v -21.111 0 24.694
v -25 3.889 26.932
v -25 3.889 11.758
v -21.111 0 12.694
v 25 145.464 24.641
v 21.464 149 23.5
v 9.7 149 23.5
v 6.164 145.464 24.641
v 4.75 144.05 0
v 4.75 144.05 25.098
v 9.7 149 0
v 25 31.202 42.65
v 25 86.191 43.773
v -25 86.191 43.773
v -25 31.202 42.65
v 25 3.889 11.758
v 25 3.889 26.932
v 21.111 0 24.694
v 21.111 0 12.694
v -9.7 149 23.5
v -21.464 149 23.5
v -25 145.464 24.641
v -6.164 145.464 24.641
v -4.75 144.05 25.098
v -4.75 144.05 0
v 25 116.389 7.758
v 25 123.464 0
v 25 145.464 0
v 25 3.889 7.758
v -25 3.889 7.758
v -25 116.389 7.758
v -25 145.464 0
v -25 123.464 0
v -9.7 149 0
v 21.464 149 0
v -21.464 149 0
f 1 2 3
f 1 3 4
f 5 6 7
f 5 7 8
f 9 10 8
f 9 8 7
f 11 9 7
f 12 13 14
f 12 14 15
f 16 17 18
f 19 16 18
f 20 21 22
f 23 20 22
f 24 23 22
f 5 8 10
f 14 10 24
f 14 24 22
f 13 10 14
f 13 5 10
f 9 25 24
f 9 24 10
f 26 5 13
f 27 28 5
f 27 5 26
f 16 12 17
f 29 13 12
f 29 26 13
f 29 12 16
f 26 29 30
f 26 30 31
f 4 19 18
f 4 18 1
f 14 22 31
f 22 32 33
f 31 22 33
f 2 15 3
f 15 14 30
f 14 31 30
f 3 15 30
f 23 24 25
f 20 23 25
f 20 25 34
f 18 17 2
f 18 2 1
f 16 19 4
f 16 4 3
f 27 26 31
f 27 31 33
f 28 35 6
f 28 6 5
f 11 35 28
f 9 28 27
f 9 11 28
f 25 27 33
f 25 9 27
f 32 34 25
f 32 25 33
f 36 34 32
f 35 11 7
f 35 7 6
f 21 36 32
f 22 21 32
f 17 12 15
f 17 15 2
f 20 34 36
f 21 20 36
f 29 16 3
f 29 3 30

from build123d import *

# Parameters (mm, degrees)
F1_DEPTH = 48
F3_DEPTH = 25


with BuildPart() as f1:
    # F0 (on Top) → F1 (new body)
    with BuildSketch(Plane.XY):
        Polygon((-21.110913, 0), (0, 0), (0, 144.050253), (-4.75, 144.050253), (-9.699747, 149), (-21.464466, 149), (-25, 145.464466), (-25, 3.889087), align=None)
    extrude(amount=F1_DEPTH)

    # F2 (on face) → F3 (cut, through all)
    with BuildSketch(Plane(origin=(-25, 0, 0), x_dir=(0, -1, 0), z_dir=(-1, 0, 0))):
        Polygon((-145.464466, 48), (-145.464466, 24.641155), (-86.190659, 43.772807), (-31.202125, 42.649837), (-3.889087, 26.931672), (-3.889087, 48), align=None)
        Polygon((-116.389087, 7.758158), (-123.464466, 0), (-3.889087, 0), (-3.889087, 7.758158), align=None)
        Polygon((-149, 23.5), (-145.464466, 24.641155), (-145.464466, 48), (-149, 48), align=None)
        Polygon((0, 48), (-3.889087, 48), (-3.889087, 26.931672), (0, 24.693572), align=None)
        Polygon((-3.889087, 7.758158), (-3.889087, 0), (0, 0), (0, 12.693572), (-3.889087, 11.758158), align=None)
    extrude(amount=-F3_DEPTH, mode=Mode.SUBTRACT)

    # F4: F1 across plane


with BuildPart() as f1_1:
    add(f1.part)
    add(f1.part.mirror(Plane.YZ))


solid = f1_1.part
